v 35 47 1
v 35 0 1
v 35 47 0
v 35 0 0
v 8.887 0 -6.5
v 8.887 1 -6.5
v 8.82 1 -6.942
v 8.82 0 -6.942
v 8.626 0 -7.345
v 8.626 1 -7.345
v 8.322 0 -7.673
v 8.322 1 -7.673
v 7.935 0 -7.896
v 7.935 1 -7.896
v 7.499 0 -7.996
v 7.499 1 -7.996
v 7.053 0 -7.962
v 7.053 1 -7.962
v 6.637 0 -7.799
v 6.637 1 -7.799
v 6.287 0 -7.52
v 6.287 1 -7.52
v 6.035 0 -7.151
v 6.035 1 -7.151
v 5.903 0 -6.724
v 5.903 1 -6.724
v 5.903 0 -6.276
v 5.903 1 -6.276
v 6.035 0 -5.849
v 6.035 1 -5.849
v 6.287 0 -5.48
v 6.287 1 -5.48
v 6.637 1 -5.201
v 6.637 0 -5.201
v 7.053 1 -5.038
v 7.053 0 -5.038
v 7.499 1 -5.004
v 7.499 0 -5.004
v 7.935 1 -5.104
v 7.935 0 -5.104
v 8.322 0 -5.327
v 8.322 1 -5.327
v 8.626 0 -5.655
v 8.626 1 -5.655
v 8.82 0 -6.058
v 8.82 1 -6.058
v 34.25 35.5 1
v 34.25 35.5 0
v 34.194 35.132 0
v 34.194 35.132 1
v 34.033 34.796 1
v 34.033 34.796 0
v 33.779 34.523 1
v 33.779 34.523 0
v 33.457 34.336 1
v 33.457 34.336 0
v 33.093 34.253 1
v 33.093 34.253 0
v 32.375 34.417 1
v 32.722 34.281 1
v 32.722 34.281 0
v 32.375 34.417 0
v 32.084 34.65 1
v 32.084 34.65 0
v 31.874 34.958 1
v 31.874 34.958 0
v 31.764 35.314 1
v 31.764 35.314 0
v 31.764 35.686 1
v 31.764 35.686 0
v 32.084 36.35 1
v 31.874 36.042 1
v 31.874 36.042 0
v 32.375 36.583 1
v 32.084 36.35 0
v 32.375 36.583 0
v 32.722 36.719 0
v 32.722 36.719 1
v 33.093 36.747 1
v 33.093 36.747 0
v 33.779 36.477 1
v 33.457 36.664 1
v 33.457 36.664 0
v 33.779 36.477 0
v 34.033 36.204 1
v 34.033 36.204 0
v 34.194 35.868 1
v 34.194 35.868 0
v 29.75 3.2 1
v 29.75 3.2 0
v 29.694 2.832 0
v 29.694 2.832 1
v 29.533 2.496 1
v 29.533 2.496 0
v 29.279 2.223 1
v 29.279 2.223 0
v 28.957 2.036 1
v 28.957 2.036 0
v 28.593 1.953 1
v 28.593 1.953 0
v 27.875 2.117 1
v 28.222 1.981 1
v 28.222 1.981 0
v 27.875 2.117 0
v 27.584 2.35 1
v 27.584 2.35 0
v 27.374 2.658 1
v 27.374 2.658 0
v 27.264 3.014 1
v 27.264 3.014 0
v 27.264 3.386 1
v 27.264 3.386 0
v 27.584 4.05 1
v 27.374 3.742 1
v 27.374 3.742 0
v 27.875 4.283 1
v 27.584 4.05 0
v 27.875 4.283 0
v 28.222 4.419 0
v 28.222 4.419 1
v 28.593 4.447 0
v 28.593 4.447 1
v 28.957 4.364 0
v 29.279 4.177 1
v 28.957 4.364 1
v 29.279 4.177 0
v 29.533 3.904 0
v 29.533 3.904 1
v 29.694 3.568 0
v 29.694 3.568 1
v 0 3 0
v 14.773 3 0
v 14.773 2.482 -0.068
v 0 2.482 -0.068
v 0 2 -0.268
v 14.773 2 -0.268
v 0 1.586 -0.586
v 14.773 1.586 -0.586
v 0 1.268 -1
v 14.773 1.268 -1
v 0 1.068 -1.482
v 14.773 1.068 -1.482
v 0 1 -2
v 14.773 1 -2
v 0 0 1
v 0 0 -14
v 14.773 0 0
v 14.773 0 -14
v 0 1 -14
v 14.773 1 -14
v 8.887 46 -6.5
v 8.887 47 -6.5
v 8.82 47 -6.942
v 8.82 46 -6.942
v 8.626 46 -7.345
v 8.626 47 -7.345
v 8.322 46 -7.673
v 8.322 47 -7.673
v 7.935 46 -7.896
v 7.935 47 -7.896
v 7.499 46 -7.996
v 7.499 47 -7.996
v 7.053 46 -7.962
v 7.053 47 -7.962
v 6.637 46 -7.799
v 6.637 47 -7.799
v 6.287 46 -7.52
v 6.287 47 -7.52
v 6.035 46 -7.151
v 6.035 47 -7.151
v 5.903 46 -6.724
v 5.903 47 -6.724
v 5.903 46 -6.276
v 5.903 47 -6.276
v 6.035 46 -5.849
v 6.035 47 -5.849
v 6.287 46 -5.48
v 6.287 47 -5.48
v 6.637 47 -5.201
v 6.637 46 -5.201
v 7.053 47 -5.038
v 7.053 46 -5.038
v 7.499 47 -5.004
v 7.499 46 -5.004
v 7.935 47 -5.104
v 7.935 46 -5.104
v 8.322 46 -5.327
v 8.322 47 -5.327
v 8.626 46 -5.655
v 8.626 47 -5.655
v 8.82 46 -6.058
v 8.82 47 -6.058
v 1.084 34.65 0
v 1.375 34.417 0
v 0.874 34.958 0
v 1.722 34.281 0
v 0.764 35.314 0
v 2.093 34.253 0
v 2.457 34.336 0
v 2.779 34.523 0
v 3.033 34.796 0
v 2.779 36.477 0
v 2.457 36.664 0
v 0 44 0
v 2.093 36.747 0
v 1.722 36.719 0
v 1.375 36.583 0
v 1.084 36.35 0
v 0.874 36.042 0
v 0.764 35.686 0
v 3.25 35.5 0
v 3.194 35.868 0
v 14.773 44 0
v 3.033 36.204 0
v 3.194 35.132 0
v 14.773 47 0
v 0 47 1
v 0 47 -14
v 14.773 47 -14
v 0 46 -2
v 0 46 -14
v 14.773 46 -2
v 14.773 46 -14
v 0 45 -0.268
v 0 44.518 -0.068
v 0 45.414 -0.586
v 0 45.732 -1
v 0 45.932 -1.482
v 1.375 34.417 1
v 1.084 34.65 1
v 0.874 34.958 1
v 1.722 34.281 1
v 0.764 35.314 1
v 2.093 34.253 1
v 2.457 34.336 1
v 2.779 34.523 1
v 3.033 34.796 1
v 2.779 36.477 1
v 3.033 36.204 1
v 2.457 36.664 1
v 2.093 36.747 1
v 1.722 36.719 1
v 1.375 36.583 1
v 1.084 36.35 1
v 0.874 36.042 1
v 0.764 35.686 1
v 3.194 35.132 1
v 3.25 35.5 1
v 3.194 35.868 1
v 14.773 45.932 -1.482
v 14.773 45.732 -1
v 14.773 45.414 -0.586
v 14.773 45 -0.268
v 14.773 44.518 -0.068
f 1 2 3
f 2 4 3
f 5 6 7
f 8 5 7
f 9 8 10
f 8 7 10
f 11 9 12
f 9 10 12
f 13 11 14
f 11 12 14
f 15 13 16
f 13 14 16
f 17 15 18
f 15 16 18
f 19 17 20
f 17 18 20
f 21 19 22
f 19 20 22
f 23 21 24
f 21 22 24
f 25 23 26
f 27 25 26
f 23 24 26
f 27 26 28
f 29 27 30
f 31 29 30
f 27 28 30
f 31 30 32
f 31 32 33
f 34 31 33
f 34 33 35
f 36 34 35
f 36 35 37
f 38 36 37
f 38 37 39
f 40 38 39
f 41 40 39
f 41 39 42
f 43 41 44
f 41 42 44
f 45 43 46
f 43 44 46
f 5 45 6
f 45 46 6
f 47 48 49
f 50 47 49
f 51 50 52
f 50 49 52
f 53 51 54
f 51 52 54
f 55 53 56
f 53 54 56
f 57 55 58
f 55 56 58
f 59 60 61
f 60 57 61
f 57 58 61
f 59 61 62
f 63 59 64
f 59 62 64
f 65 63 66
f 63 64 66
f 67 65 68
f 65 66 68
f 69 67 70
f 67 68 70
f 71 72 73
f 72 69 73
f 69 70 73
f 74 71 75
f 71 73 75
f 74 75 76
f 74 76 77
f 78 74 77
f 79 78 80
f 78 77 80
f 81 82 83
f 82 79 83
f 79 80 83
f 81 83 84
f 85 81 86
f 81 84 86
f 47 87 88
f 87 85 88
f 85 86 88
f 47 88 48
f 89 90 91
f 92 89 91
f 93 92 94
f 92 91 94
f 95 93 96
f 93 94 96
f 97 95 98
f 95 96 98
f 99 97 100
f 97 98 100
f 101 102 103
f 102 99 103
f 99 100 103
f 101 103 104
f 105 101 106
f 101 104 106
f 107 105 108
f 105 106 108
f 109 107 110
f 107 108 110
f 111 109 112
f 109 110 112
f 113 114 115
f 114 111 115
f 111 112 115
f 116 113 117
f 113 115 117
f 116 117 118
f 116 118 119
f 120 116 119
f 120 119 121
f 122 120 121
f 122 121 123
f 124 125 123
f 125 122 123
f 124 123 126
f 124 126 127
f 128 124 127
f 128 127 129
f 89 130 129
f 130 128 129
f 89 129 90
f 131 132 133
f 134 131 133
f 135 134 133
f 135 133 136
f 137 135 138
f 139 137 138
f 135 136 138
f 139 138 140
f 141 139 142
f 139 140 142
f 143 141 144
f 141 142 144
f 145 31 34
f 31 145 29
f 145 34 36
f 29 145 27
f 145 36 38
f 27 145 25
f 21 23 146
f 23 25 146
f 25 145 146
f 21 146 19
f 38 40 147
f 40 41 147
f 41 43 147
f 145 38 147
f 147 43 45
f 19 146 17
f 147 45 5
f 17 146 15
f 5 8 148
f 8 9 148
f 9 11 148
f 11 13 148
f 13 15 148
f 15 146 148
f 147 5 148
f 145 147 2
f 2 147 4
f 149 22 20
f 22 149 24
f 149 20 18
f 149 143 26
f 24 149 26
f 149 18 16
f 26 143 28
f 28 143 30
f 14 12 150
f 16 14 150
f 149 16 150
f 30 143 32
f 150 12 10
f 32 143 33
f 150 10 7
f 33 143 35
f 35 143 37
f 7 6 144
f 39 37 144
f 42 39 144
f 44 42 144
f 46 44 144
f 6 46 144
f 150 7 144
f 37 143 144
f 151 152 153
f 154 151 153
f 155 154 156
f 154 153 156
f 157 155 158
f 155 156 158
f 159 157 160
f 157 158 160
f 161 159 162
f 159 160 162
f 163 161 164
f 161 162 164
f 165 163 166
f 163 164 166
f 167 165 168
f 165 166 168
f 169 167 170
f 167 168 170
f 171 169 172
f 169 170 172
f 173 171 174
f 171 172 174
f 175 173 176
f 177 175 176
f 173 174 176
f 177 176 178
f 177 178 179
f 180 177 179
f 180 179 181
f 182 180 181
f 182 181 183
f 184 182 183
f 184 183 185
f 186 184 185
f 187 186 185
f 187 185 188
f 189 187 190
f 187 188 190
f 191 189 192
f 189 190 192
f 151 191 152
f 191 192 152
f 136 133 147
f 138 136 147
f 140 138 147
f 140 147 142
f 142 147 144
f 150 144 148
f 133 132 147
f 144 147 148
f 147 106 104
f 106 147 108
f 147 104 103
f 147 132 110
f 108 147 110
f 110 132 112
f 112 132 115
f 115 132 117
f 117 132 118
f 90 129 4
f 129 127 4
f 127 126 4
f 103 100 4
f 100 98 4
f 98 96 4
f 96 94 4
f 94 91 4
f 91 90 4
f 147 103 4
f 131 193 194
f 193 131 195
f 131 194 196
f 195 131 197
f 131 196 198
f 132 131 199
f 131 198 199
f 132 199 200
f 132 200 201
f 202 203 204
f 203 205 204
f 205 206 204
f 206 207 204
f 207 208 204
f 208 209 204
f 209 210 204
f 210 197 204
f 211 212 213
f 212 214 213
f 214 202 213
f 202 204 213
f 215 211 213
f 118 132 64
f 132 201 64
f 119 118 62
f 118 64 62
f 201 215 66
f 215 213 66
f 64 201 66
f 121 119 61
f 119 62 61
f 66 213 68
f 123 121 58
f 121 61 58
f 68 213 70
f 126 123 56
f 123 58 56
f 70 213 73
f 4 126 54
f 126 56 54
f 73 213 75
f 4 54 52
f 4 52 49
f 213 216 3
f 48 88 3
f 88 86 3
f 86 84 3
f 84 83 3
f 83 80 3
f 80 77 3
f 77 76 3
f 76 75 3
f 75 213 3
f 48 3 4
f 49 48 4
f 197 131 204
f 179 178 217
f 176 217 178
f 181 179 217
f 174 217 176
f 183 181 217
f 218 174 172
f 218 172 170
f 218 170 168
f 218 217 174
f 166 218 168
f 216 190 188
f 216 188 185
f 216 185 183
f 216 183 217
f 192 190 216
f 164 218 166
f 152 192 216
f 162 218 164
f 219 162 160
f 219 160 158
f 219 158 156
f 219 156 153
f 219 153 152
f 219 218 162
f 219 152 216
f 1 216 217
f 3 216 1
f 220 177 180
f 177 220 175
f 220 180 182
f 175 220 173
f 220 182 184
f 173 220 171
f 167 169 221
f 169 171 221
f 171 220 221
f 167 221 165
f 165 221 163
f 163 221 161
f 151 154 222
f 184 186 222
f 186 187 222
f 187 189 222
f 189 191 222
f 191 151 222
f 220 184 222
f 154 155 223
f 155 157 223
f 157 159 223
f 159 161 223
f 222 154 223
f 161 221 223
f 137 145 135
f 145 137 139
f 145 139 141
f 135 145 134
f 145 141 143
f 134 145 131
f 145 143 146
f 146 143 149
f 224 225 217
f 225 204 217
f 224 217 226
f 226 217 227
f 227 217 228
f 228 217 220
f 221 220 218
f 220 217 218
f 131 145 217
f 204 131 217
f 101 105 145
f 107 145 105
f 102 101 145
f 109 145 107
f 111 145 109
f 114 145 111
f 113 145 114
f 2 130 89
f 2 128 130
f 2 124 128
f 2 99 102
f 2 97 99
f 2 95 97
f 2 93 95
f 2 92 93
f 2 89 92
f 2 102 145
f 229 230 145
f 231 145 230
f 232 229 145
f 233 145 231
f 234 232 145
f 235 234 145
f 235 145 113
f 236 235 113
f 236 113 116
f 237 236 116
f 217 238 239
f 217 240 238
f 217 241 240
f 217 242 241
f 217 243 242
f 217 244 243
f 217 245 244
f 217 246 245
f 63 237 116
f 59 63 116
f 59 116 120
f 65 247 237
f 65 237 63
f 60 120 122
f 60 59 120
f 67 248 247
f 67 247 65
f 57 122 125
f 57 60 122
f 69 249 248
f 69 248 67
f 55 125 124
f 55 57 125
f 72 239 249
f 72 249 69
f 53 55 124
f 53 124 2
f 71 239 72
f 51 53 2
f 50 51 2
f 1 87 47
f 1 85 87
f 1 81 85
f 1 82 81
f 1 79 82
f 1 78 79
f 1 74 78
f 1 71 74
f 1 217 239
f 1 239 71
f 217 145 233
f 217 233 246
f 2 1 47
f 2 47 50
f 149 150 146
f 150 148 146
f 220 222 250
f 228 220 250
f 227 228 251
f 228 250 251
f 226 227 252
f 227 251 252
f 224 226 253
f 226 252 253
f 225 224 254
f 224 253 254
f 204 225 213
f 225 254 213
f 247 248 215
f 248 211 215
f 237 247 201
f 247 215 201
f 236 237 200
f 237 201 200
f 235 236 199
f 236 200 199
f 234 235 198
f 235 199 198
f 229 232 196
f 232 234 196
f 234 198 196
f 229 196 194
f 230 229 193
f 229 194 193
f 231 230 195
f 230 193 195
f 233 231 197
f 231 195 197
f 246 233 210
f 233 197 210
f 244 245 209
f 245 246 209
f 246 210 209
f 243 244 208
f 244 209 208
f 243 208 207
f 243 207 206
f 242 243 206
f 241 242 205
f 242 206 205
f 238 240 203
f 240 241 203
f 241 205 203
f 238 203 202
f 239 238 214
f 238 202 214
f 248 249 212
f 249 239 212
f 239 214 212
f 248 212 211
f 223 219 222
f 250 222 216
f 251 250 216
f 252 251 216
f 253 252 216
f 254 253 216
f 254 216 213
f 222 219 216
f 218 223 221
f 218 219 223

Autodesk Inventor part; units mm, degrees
ref_plane "YZ Plane" through (0, 0, 0) normal (1, 0, 0) x (0, 1, 0)
ref_plane "XZ Plane" through (0, 0, 0) normal (0, 1, 0) x (-1, 0, 0)
ref_plane "XY Plane" through (0, 0, 0) normal (0, 0, 1) x (1, 0, 0)
sketch "Sketch12" plane through (0, 0, 0) normal (0, 0, 1) x (1, 0, 0)
  line L0 (0, 0) -> (35, 0)
  line L1 (35, 0) -> (35, 47)
  line L2 (35, 47) -> (0, 47)
  line L3 (0, 47) -> (0, 0)
  line L4 (0, 47) -> (2, 47) construction
  line L5 (2, 47) -> (2, 35.5) construction
  line L6 (35, 47) -> (33, 47) construction
  line L7 (33, 47) -> (33, 35.5) construction
  circle A0 centre (33, 35.5) radius 1.25
  circle A1 centre (2, 35.5) radius 1.25
  line L8 (0, 0) -> (6.5, 0) construction
  line L9 (35, 0) -> (28.5, 0) construction
  line L10 (6.5, 0) -> (6.5, 3.2) construction
  line L11 (28.5, 0) -> (28.5, 3.2) construction
  circle A2 centre (28.5, 3.2) radius 1.25
  dimension "d49" = 35
  dimension "d50" = 47
  dimension "d97" = 2
  dimension "d98" = 11.5
  dimension "d99" = 2
  dimension "d100" = 2.5
  dimension "d101" = 2.5
  dimension "d102" = 11.5
  dimension "d104" = 6.5
  dimension "d106" = 3.2
  dimension "d108" = 2.5
extrude "Extrusión8" add sketch "Sketch12" along normal blind 1
sketch "Sketch25" plane through (0, 47, 0) normal (0, 1, 0) x (1, 0, 0)
  point P0 (0, 0)
sketch "Sketch27" plane through (0, 0, 0) normal (0, -1, 0) x (1, 0, 0)
  line L0 (0, 0) -> (14.7732, 0)
  line L1 (14.7732, 0) -> (14.7732, -14)
  line L2 (14.7732, -14) -> (0, -14)
  line L3 (0, -14) -> (0, 0)
  dimension "d125" = 14
extrude "Extrusion11" add sketch "Sketch27" against normal blind 1
fillet "Empalme1" radius 2 1 edges at (7.3866, 1, 0)
sketch "Boceto29" plane through (0, 47, 0) normal (0, 1, 0) x (1, 0, 0)
  line L0 (14.7732, 0) -> (14.7732, 2) projected
  line L1 (0, 0) -> (14.7732, 0) projected
  line L2 (14.7732, 0) -> (0, 0)
  line L3 (0, 14) -> (0, 2) projected
  line L4 (0, 0) -> (0, 14)
  line L5 (14.7732, 14) -> (0, 14) projected
  line L6 (0, 14) -> (14.7732, 14)
  line L7 (14.7732, 14) -> (14.7732, 0)
  point P0 (0, 2)
extrude "Extrusión12" add sketch "Boceto29" against normal blind 1
fillet "Empalme2" radius 2 1 edges at (7.3866, 46, 0)
sketch "Boceto30" plane through (0, 47, 1) normal (0, 1, 0) x (1, 0, 0)
  line L0 (0, 15) -> (0, 0) projected
  line L1 (0, 7.5) -> (14.7732, 7.5)
  line L2 (14.7732, 15) -> (14.7732, 3) projected
  line L3 (7.3866, 7.5) -> (7.3866, 0)
  line L4 (35, 0) -> (0, 0) projected
  circle A0 centre (7.3866, 7.5) radius 1.5
  point P0 (0, 1)
  dimension "d126" = 3
extrude "Extrusión13" cut sketch "Boceto30" along normal through all both and the other way through all contours A0 L1 | L1 L3 A0 | L1 A0 L3
equation "\"BendRadius\" = Thickness"
equation "\"BendReliefWidth\" = Thickness"
equation "\"BendReliefDepth\" = 0.5 * Thickness"
equation "\"CornerReliefSize\" = 4 * Thickness"
equation "\"MinimumRemnant\" = 2 * Thickness"
equation "\"TransitionRadius\" = BendRadius"
equation "\"JacobiRadiusSize\" = BendRadius"
equation "\"GapSize\" = Thickness"
equation "\"Thickness\" = 1"
properties part number "Suportmotor"
